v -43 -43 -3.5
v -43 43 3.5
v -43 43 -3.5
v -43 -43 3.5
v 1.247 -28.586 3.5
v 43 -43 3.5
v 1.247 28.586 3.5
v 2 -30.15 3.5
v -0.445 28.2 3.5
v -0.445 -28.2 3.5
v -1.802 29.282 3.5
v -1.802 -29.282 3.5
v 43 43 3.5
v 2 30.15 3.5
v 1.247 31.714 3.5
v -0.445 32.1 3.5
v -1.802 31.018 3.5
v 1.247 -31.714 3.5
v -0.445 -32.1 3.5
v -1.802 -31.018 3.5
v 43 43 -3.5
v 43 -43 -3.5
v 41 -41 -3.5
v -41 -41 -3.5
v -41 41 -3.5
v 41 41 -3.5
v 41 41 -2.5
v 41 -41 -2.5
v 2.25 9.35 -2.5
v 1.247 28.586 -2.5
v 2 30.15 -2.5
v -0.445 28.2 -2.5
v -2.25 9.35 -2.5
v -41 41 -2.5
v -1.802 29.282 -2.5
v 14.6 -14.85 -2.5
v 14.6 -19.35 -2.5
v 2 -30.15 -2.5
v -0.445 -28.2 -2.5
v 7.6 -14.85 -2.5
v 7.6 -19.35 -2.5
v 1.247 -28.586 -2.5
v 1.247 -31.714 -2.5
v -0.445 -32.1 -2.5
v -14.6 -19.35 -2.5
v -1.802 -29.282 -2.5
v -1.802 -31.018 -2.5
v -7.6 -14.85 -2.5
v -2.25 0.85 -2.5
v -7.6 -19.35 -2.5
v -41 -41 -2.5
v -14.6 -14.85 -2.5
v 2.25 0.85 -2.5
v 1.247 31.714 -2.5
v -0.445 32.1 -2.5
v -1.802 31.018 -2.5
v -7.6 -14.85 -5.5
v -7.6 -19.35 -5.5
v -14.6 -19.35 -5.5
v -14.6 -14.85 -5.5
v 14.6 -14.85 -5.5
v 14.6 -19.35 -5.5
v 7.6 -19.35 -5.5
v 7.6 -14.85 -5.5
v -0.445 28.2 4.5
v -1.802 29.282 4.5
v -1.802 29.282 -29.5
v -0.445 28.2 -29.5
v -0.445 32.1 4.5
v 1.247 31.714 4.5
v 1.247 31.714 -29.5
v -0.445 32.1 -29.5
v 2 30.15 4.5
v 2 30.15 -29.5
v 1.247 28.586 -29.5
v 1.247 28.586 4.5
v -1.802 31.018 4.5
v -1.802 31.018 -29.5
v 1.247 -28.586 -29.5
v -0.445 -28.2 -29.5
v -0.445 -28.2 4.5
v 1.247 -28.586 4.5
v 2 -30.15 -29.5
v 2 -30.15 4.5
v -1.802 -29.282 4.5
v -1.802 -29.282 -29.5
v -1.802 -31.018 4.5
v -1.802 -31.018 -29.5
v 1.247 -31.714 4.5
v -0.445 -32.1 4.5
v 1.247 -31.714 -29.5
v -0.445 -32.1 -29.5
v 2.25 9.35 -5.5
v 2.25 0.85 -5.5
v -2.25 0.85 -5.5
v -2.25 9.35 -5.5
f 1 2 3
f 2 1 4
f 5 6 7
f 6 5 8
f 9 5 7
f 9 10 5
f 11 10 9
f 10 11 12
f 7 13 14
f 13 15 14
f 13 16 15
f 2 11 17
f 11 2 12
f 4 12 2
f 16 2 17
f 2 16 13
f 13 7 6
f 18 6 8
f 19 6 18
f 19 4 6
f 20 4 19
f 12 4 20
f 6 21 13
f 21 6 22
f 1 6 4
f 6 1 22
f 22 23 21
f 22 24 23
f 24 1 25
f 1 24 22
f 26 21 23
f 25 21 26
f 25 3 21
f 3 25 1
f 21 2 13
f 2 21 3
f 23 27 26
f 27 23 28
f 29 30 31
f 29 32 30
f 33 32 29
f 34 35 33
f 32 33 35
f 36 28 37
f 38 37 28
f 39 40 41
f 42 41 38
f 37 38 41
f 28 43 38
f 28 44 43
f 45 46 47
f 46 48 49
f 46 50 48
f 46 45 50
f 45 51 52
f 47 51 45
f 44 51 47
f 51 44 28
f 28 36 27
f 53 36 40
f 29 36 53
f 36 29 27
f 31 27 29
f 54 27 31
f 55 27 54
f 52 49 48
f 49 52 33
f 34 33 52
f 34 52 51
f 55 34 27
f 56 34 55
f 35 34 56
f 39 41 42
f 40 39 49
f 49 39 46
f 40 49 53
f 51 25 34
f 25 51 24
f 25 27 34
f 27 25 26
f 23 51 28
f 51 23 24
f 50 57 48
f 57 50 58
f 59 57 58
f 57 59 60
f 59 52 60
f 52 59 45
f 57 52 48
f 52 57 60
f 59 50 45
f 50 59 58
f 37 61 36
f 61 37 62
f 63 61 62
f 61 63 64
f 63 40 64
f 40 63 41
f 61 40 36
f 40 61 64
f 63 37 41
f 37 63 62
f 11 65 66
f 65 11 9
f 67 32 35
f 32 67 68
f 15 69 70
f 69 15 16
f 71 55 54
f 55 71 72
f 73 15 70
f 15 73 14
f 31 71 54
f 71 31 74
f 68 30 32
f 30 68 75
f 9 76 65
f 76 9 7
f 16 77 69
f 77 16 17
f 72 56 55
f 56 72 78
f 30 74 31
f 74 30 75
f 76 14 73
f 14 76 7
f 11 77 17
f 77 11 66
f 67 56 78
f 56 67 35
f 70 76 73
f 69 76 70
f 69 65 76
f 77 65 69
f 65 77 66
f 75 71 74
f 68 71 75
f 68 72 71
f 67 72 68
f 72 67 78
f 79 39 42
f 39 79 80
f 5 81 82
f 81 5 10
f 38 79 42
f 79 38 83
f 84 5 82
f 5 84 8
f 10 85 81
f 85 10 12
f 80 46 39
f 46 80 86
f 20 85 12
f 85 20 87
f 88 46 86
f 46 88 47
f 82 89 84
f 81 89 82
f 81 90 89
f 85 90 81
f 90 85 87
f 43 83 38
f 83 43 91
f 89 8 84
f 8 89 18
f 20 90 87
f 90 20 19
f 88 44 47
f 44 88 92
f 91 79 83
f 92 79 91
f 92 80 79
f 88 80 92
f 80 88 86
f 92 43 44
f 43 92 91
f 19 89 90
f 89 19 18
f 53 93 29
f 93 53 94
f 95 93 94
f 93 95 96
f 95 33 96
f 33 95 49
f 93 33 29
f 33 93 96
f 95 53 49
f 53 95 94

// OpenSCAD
// Parameters
plate_width_mm = 86; //[43:172:1]
plate_height_mm = 86; //[43:172:1]
plate_thickness_mm = 7; //[3.5:14:0.5]
top_taper_width_mm = 80; //[60:86:0.5]
top_taper_height_mm = 80; //[60:86:0.5]
rear_cavity_depth_mm = 25; //[12.5:50:1]
wall_thickness_mm = 2; //[1:4:0.25]
pin_hole_live_neutral_spacing_mm = 22.2; //[11.1:44.4:0.1]
pin_hole_live_neutral_width_mm = 7; //[3.5:14:0.1]
pin_hole_live_neutral_height_mm = 4.5; //[2.25:9:0.1]
pin_hole_earth_width_mm = 4.5; //[2.25:9:0.1]
pin_hole_earth_height_mm = 8.5; //[4.25:17:0.1]
pin_hole_depth_mm = 8; //[4:16:0.5]
mounting_screw_hole_clearance_diameter_mm = 4; //[2:8:0.1]
mounting_screw_centres_mm = 60.3; //[30.15:120.6:0.1]
counterbore_depth_mm = 2.5; //[1.25:5:0.1]
counterbore_diameter_mm = 8; //[4:16:0.1]
switch_offset_x_mm = 18; //[0:30:0.5]
switch_offset_y_mm = 18; //[0:30:0.5]
switch_recess_width_mm = 28; //[14:56:0.5]
switch_recess_height_mm = 18; //[9:36:0.5]
switch_recess_depth_mm = 1.2; //[0.6:2.4:0.1]
socket_offset_y_mm = -6; //[-15:15:0.5]
earth_offset_y_mm = 11.1; //[6:16:0.1]
live_neutral_offset_y_mm = -11.1; //[-16:-6:0.1]
overlap_mm = 1; //[0.5:2:0.1]

// Mains Socket - Detailed Geometry
module mains_socket() {
  color("White") {
    difference() {
      // Faceplate body
      hull() {
        translate([0, 0, 0])
          cube([plate_width_mm, plate_height_mm, plate_thickness_mm], center=true);
        translate([0, 0, 0])
          cube([top_taper_width_mm, top_taper_height_mm, plate_thickness_mm], center=true);
      }
      // Rear cavity
      translate([0, 0, -plate_thickness_mm/2 - rear_cavity_depth_mm/2 + overlap_mm])
        cube([plate_width_mm - 2*wall_thickness_mm, plate_height_mm - 2*wall_thickness_mm, rear_cavity_depth_mm], center=true);
    }
  }
}

// Mains Socket Earth Position - Detailed Geometry
module mains_socket_earth_position() {
  color("Gray") {
    translate([0, socket_offset_y_mm + earth_offset_y_mm, plate_thickness_mm/2 - (pin_hole_depth_mm + overlap_mm)/2])
      cube([pin_hole_earth_width_mm, pin_hole_earth_height_mm, pin_hole_depth_mm + overlap_mm], center=true);
  }
}

// Mains Socket Holes - Detailed Geometry
module mains_socket_holes() {
  color("Gray") {
    union() {
      // Live pin hole
      translate([-pin_hole_live_neutral_spacing_mm/2, socket_offset_y_mm + live_neutral_offset_y_mm, plate_thickness_mm/2 - (pin_hole_depth_mm + overlap_mm)/2])
        cube([pin_hole_live_neutral_width_mm, pin_hole_live_neutral_height_mm, pin_hole_depth_mm + overlap_mm], center=true);
      // Neutral pin hole
      translate([pin_hole_live_neutral_spacing_mm/2, socket_offset_y_mm + live_neutral_offset_y_mm, plate_thickness_mm/2 - (pin_hole_depth_mm + overlap_mm)/2])
        cube([pin_hole_live_neutral_width_mm, pin_hole_live_neutral_height_mm, pin_hole_depth_mm + overlap_mm], center=true);
    }
  }
}

// Assembly
module assembly() {
  mains_socket();
  mains_socket_earth_position();
  mains_socket_holes();
  // Mounting screw holes
  color("Black") {
    union() {
      translate([0, mounting_screw_centres_mm/2, -rear_cavity_depth_mm/2])
        cylinder(r=mounting_screw_hole_clearance_diameter_mm/2, h=plate_thickness_mm + rear_cavity_depth_mm + 2*overlap_mm, center=true);
      translate([0, -mounting_screw_centres_mm/2, -rear_cavity_depth_mm/2])
        cylinder(r=mounting_screw_hole_clearance_diameter_mm/2, h=plate_thickness_mm + rear_cavity_depth_mm + 2*overlap_mm, center=true);
    }
  }
  // Mounting screw counterbores
  color("Black") {
    union() {
      translate([0, mounting_screw_centres_mm/2, plate_thickness_mm/2 - (counterbore_depth_mm + overlap_mm)/2])
        cylinder(r=counterbore_diameter_mm/2, h=counterbore_depth_mm + overlap_mm, center=true);
      translate([0, -mounting_screw_centres_mm/2, plate_thickness_mm/2 - (counterbore_depth_mm + overlap_mm)/2])
        cylinder(r=counterbore_diameter_mm/2, h=counterbore_depth_mm + overlap_mm, center=true);
    }
  }
  // Switch recess
  color("Gray") {
    translate([switch_offset_x_mm, switch_offset_y_mm, plate_thickness_mm/2 - (switch_recess_depth_mm + overlap_mm)/2])
      cube([switch_recess_width_mm, switch_recess_height_mm, switch_recess_depth_mm + overlap_mm], center=true);
  }
}

assembly();
